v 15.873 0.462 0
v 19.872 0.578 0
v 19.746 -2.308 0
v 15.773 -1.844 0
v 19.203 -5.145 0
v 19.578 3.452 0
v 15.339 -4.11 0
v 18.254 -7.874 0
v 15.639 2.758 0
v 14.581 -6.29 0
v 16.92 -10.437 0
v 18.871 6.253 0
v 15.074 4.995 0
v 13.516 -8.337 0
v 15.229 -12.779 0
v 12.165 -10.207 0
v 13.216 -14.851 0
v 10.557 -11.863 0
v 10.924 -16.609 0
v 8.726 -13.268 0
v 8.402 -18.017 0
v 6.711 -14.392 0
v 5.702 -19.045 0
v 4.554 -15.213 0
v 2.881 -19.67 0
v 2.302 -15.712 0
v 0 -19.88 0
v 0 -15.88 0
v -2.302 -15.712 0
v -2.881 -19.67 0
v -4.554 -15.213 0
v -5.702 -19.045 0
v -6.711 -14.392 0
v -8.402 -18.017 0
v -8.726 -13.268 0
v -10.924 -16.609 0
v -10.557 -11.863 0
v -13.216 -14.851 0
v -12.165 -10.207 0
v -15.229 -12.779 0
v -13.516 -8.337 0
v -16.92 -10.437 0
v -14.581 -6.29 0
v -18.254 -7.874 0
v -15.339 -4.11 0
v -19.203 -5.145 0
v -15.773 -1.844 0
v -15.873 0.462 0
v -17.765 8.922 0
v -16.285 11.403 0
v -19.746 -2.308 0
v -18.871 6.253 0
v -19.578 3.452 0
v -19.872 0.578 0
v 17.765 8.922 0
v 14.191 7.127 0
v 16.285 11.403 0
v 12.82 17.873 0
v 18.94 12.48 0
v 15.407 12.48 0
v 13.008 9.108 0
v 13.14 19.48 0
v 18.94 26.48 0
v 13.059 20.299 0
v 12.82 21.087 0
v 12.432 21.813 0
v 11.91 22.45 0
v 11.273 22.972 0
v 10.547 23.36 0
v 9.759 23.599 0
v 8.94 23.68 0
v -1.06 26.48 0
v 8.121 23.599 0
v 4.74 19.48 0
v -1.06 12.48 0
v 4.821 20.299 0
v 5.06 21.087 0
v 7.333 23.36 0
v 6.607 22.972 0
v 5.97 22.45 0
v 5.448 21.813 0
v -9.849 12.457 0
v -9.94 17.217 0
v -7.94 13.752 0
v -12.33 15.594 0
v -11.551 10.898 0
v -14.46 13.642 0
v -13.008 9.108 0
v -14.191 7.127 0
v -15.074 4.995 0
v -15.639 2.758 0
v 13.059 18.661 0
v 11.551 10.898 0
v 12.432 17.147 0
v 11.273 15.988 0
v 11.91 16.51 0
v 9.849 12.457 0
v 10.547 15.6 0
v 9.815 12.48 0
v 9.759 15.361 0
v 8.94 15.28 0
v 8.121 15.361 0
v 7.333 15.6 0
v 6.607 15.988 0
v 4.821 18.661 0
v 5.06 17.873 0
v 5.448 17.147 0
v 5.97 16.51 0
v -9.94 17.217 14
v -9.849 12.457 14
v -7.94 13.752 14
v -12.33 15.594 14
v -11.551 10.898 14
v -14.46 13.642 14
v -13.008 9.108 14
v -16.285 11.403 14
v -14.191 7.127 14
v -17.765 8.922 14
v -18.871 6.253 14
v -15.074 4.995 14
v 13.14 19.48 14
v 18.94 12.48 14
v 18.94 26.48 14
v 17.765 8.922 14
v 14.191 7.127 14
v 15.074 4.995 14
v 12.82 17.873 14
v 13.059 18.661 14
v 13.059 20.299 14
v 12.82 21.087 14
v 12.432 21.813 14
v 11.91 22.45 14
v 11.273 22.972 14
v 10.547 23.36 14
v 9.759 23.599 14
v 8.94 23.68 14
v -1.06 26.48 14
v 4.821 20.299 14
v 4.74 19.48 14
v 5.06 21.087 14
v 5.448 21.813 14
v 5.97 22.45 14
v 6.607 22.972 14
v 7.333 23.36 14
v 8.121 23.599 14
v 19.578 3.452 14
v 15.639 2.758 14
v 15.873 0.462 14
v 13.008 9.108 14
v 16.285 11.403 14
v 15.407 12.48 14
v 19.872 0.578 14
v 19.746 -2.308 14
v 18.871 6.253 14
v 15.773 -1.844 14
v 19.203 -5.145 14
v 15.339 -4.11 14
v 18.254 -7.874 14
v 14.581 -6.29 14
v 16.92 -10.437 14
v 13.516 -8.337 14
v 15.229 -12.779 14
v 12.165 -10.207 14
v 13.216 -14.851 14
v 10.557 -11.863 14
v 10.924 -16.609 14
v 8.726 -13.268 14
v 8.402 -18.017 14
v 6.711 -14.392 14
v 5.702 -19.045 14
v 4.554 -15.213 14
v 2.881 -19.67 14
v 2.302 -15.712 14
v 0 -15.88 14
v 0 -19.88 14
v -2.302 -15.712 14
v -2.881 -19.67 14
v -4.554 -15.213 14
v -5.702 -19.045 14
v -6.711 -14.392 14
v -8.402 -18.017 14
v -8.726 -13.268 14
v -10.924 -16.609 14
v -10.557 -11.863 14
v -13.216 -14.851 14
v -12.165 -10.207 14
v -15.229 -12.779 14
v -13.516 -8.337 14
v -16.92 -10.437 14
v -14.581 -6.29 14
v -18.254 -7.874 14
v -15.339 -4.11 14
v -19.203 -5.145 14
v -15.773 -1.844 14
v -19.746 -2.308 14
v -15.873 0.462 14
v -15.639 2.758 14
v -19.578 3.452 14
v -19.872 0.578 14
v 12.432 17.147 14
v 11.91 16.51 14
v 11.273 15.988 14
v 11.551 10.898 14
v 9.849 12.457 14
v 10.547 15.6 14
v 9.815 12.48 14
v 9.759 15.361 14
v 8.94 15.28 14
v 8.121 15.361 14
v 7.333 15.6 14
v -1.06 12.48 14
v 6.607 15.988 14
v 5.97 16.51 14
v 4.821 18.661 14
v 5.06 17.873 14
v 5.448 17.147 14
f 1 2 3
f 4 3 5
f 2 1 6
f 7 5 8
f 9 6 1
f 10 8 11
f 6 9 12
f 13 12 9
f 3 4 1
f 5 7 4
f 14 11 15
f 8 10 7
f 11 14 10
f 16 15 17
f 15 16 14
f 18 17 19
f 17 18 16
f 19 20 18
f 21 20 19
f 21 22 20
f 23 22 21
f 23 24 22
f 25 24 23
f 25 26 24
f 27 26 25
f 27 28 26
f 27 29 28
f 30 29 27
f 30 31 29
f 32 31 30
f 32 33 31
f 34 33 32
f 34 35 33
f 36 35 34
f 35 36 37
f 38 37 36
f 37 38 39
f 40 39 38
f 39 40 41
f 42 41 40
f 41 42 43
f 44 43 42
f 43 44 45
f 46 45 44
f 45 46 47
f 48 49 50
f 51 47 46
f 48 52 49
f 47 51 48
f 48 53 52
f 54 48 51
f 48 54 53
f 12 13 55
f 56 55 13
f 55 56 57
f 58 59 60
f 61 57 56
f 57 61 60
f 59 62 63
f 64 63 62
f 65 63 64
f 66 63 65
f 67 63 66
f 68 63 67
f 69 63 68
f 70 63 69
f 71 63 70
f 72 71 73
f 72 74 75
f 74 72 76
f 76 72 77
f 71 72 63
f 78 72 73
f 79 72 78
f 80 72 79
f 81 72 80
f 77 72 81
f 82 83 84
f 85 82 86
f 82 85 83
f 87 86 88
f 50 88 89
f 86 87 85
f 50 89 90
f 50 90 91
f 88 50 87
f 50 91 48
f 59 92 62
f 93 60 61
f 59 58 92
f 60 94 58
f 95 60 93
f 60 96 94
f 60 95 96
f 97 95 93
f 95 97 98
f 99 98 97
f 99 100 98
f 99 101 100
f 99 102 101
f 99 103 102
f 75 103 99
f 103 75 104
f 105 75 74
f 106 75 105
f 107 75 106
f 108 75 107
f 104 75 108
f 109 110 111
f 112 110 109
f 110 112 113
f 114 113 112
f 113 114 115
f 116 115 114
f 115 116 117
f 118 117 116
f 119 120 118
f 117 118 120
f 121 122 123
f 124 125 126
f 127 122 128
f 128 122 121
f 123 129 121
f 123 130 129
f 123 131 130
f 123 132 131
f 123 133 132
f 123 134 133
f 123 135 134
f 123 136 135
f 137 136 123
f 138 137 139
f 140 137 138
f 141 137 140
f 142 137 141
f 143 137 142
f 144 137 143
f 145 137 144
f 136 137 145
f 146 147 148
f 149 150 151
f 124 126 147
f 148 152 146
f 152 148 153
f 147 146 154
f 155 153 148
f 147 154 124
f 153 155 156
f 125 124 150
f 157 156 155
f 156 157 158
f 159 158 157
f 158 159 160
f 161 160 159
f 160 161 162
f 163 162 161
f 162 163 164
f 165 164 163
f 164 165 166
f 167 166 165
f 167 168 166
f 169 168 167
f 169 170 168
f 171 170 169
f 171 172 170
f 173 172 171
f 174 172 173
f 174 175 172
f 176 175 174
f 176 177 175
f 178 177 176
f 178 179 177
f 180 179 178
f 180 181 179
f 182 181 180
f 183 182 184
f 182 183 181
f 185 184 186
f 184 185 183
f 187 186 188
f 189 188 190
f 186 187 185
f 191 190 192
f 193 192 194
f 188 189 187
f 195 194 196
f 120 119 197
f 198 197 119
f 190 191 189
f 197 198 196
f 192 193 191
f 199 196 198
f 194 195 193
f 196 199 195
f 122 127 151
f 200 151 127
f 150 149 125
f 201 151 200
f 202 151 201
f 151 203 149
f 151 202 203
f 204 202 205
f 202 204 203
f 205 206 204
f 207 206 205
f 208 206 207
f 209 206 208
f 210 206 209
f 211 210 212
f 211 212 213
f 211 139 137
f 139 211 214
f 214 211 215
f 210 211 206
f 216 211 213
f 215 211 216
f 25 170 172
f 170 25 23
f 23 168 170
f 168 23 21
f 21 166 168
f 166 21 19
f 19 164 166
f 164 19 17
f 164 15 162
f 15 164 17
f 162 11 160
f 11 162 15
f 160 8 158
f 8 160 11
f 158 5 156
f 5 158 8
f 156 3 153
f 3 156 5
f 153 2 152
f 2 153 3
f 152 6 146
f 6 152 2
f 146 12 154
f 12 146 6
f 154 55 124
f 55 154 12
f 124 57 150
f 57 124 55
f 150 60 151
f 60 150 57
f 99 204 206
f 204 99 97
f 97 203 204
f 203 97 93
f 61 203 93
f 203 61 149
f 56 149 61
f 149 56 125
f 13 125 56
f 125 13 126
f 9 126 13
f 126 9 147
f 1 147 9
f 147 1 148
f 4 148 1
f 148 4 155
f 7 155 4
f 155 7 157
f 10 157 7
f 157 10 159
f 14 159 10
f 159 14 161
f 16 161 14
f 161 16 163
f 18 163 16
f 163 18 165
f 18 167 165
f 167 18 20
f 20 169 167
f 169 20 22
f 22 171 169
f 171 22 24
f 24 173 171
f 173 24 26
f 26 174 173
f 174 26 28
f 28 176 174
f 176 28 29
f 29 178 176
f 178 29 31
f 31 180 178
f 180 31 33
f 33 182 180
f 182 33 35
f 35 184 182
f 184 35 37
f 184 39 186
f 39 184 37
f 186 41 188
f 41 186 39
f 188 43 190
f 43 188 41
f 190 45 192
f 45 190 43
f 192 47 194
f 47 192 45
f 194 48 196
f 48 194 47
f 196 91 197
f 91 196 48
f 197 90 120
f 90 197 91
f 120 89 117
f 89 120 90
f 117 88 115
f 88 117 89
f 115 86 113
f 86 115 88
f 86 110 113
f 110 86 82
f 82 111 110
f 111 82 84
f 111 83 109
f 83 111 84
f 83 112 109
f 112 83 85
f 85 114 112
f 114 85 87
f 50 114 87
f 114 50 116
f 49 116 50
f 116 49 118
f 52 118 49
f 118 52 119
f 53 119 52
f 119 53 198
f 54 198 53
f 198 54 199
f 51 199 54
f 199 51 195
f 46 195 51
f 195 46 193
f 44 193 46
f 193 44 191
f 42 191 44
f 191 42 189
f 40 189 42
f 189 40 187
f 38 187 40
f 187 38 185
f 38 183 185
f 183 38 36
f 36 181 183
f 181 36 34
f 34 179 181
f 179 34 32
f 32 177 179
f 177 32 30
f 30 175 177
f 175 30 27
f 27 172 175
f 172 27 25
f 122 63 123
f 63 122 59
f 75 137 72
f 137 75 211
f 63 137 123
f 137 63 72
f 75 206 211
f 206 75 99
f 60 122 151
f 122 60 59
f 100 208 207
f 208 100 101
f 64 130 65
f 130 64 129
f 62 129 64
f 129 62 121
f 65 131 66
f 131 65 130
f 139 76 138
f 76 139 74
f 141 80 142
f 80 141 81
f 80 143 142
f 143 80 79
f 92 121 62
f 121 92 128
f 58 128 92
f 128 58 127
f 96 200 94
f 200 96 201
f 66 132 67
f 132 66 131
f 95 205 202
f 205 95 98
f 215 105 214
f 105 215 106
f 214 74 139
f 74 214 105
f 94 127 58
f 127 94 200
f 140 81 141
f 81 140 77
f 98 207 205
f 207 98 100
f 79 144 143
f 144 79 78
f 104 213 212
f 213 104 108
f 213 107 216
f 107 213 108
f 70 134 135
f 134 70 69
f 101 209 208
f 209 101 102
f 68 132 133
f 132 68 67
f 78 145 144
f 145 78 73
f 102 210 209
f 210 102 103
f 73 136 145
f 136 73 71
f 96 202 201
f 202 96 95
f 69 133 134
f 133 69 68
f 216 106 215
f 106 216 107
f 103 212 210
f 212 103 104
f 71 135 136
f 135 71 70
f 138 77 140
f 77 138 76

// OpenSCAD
$fn = 32;

// ----------------------------------------------------------------------
// Pipe clamp: 39.76 mm ring, 4 mm wall, 14 mm wide
// ----------------------------------------------------------------------

// --- parameters (mm) ---
outer_r = 19.88;          // clamp outside radius
inner_r = 15.88;          // pipe bore radius
band = 4;                 // band thickness
clamp_w = 14;             // clamp width
opening = 60;             // opening angle between the ends
lug_w = 20;               // lug width
lug_len = 14;             // lug length
bolt_d = 8.4;             // bolt hole

clamp_profile = [[-9.94, 17.217], [-12.33, 15.594], [-14.46, 13.642], [-16.285, 11.403], [-17.765, 8.922], [-18.871, 6.253], [-19.578, 3.452], [-19.872, 0.578], [-19.746, -2.308], [-19.203, -5.145], [-18.254, -7.874], [-16.92, -10.437], [-15.229, -12.779], [-13.216, -14.851], [-10.924, -16.609], [-8.402, -18.017], [-5.702, -19.045], [-2.881, -19.67], [0, -19.88], [2.881, -19.67], [5.702, -19.045], [8.402, -18.017], [10.924, -16.609], [13.216, -14.851], [15.229, -12.779], [16.92, -10.437], [18.254, -7.874], [19.203, -5.145], [19.746, -2.308], [19.872, 0.578], [19.578, 3.452], [18.871, 6.253], [17.765, 8.922], [16.285, 11.403], [14.46, 13.642], [12.33, 15.594], [9.94, 17.217], [7.94, 13.752], [9.849, 12.457], [11.551, 10.898], [13.008, 9.108], [14.191, 7.127], [15.074, 4.995], [15.639, 2.758], [15.873, 0.462], [15.773, -1.844], [15.339, -4.11], [14.581, -6.29], [13.516, -8.337], [12.165, -10.207], [10.557, -11.863], [8.726, -13.268], [6.711, -14.392], [4.554, -15.213], [2.302, -15.712], [0, -15.88], [-2.302, -15.712], [-4.554, -15.213], [-6.711, -14.392], [-8.726, -13.268], [-10.557, -11.863], [-12.165, -10.207], [-13.516, -8.337], [-14.581, -6.29], [-15.339, -4.11], [-15.773, -1.844], [-15.873, 0.462], [-15.639, 2.758], [-15.074, 4.995], [-14.191, 7.127], [-13.008, 9.108], [-11.551, 10.898], [-9.849, 12.457], [-7.94, 13.752]];

difference() {
  union() {
    linear_extrude(height = clamp_w) polygon(clamp_profile);
    /* bolt lug on the other end */
    translate([-1.06, 12.48, 0]) cube([lug_w, 14, clamp_w]);
  }
  translate([8.94, 19.48, -2.5]) cylinder(h = clamp_w + 5, d = bolt_d);
}
